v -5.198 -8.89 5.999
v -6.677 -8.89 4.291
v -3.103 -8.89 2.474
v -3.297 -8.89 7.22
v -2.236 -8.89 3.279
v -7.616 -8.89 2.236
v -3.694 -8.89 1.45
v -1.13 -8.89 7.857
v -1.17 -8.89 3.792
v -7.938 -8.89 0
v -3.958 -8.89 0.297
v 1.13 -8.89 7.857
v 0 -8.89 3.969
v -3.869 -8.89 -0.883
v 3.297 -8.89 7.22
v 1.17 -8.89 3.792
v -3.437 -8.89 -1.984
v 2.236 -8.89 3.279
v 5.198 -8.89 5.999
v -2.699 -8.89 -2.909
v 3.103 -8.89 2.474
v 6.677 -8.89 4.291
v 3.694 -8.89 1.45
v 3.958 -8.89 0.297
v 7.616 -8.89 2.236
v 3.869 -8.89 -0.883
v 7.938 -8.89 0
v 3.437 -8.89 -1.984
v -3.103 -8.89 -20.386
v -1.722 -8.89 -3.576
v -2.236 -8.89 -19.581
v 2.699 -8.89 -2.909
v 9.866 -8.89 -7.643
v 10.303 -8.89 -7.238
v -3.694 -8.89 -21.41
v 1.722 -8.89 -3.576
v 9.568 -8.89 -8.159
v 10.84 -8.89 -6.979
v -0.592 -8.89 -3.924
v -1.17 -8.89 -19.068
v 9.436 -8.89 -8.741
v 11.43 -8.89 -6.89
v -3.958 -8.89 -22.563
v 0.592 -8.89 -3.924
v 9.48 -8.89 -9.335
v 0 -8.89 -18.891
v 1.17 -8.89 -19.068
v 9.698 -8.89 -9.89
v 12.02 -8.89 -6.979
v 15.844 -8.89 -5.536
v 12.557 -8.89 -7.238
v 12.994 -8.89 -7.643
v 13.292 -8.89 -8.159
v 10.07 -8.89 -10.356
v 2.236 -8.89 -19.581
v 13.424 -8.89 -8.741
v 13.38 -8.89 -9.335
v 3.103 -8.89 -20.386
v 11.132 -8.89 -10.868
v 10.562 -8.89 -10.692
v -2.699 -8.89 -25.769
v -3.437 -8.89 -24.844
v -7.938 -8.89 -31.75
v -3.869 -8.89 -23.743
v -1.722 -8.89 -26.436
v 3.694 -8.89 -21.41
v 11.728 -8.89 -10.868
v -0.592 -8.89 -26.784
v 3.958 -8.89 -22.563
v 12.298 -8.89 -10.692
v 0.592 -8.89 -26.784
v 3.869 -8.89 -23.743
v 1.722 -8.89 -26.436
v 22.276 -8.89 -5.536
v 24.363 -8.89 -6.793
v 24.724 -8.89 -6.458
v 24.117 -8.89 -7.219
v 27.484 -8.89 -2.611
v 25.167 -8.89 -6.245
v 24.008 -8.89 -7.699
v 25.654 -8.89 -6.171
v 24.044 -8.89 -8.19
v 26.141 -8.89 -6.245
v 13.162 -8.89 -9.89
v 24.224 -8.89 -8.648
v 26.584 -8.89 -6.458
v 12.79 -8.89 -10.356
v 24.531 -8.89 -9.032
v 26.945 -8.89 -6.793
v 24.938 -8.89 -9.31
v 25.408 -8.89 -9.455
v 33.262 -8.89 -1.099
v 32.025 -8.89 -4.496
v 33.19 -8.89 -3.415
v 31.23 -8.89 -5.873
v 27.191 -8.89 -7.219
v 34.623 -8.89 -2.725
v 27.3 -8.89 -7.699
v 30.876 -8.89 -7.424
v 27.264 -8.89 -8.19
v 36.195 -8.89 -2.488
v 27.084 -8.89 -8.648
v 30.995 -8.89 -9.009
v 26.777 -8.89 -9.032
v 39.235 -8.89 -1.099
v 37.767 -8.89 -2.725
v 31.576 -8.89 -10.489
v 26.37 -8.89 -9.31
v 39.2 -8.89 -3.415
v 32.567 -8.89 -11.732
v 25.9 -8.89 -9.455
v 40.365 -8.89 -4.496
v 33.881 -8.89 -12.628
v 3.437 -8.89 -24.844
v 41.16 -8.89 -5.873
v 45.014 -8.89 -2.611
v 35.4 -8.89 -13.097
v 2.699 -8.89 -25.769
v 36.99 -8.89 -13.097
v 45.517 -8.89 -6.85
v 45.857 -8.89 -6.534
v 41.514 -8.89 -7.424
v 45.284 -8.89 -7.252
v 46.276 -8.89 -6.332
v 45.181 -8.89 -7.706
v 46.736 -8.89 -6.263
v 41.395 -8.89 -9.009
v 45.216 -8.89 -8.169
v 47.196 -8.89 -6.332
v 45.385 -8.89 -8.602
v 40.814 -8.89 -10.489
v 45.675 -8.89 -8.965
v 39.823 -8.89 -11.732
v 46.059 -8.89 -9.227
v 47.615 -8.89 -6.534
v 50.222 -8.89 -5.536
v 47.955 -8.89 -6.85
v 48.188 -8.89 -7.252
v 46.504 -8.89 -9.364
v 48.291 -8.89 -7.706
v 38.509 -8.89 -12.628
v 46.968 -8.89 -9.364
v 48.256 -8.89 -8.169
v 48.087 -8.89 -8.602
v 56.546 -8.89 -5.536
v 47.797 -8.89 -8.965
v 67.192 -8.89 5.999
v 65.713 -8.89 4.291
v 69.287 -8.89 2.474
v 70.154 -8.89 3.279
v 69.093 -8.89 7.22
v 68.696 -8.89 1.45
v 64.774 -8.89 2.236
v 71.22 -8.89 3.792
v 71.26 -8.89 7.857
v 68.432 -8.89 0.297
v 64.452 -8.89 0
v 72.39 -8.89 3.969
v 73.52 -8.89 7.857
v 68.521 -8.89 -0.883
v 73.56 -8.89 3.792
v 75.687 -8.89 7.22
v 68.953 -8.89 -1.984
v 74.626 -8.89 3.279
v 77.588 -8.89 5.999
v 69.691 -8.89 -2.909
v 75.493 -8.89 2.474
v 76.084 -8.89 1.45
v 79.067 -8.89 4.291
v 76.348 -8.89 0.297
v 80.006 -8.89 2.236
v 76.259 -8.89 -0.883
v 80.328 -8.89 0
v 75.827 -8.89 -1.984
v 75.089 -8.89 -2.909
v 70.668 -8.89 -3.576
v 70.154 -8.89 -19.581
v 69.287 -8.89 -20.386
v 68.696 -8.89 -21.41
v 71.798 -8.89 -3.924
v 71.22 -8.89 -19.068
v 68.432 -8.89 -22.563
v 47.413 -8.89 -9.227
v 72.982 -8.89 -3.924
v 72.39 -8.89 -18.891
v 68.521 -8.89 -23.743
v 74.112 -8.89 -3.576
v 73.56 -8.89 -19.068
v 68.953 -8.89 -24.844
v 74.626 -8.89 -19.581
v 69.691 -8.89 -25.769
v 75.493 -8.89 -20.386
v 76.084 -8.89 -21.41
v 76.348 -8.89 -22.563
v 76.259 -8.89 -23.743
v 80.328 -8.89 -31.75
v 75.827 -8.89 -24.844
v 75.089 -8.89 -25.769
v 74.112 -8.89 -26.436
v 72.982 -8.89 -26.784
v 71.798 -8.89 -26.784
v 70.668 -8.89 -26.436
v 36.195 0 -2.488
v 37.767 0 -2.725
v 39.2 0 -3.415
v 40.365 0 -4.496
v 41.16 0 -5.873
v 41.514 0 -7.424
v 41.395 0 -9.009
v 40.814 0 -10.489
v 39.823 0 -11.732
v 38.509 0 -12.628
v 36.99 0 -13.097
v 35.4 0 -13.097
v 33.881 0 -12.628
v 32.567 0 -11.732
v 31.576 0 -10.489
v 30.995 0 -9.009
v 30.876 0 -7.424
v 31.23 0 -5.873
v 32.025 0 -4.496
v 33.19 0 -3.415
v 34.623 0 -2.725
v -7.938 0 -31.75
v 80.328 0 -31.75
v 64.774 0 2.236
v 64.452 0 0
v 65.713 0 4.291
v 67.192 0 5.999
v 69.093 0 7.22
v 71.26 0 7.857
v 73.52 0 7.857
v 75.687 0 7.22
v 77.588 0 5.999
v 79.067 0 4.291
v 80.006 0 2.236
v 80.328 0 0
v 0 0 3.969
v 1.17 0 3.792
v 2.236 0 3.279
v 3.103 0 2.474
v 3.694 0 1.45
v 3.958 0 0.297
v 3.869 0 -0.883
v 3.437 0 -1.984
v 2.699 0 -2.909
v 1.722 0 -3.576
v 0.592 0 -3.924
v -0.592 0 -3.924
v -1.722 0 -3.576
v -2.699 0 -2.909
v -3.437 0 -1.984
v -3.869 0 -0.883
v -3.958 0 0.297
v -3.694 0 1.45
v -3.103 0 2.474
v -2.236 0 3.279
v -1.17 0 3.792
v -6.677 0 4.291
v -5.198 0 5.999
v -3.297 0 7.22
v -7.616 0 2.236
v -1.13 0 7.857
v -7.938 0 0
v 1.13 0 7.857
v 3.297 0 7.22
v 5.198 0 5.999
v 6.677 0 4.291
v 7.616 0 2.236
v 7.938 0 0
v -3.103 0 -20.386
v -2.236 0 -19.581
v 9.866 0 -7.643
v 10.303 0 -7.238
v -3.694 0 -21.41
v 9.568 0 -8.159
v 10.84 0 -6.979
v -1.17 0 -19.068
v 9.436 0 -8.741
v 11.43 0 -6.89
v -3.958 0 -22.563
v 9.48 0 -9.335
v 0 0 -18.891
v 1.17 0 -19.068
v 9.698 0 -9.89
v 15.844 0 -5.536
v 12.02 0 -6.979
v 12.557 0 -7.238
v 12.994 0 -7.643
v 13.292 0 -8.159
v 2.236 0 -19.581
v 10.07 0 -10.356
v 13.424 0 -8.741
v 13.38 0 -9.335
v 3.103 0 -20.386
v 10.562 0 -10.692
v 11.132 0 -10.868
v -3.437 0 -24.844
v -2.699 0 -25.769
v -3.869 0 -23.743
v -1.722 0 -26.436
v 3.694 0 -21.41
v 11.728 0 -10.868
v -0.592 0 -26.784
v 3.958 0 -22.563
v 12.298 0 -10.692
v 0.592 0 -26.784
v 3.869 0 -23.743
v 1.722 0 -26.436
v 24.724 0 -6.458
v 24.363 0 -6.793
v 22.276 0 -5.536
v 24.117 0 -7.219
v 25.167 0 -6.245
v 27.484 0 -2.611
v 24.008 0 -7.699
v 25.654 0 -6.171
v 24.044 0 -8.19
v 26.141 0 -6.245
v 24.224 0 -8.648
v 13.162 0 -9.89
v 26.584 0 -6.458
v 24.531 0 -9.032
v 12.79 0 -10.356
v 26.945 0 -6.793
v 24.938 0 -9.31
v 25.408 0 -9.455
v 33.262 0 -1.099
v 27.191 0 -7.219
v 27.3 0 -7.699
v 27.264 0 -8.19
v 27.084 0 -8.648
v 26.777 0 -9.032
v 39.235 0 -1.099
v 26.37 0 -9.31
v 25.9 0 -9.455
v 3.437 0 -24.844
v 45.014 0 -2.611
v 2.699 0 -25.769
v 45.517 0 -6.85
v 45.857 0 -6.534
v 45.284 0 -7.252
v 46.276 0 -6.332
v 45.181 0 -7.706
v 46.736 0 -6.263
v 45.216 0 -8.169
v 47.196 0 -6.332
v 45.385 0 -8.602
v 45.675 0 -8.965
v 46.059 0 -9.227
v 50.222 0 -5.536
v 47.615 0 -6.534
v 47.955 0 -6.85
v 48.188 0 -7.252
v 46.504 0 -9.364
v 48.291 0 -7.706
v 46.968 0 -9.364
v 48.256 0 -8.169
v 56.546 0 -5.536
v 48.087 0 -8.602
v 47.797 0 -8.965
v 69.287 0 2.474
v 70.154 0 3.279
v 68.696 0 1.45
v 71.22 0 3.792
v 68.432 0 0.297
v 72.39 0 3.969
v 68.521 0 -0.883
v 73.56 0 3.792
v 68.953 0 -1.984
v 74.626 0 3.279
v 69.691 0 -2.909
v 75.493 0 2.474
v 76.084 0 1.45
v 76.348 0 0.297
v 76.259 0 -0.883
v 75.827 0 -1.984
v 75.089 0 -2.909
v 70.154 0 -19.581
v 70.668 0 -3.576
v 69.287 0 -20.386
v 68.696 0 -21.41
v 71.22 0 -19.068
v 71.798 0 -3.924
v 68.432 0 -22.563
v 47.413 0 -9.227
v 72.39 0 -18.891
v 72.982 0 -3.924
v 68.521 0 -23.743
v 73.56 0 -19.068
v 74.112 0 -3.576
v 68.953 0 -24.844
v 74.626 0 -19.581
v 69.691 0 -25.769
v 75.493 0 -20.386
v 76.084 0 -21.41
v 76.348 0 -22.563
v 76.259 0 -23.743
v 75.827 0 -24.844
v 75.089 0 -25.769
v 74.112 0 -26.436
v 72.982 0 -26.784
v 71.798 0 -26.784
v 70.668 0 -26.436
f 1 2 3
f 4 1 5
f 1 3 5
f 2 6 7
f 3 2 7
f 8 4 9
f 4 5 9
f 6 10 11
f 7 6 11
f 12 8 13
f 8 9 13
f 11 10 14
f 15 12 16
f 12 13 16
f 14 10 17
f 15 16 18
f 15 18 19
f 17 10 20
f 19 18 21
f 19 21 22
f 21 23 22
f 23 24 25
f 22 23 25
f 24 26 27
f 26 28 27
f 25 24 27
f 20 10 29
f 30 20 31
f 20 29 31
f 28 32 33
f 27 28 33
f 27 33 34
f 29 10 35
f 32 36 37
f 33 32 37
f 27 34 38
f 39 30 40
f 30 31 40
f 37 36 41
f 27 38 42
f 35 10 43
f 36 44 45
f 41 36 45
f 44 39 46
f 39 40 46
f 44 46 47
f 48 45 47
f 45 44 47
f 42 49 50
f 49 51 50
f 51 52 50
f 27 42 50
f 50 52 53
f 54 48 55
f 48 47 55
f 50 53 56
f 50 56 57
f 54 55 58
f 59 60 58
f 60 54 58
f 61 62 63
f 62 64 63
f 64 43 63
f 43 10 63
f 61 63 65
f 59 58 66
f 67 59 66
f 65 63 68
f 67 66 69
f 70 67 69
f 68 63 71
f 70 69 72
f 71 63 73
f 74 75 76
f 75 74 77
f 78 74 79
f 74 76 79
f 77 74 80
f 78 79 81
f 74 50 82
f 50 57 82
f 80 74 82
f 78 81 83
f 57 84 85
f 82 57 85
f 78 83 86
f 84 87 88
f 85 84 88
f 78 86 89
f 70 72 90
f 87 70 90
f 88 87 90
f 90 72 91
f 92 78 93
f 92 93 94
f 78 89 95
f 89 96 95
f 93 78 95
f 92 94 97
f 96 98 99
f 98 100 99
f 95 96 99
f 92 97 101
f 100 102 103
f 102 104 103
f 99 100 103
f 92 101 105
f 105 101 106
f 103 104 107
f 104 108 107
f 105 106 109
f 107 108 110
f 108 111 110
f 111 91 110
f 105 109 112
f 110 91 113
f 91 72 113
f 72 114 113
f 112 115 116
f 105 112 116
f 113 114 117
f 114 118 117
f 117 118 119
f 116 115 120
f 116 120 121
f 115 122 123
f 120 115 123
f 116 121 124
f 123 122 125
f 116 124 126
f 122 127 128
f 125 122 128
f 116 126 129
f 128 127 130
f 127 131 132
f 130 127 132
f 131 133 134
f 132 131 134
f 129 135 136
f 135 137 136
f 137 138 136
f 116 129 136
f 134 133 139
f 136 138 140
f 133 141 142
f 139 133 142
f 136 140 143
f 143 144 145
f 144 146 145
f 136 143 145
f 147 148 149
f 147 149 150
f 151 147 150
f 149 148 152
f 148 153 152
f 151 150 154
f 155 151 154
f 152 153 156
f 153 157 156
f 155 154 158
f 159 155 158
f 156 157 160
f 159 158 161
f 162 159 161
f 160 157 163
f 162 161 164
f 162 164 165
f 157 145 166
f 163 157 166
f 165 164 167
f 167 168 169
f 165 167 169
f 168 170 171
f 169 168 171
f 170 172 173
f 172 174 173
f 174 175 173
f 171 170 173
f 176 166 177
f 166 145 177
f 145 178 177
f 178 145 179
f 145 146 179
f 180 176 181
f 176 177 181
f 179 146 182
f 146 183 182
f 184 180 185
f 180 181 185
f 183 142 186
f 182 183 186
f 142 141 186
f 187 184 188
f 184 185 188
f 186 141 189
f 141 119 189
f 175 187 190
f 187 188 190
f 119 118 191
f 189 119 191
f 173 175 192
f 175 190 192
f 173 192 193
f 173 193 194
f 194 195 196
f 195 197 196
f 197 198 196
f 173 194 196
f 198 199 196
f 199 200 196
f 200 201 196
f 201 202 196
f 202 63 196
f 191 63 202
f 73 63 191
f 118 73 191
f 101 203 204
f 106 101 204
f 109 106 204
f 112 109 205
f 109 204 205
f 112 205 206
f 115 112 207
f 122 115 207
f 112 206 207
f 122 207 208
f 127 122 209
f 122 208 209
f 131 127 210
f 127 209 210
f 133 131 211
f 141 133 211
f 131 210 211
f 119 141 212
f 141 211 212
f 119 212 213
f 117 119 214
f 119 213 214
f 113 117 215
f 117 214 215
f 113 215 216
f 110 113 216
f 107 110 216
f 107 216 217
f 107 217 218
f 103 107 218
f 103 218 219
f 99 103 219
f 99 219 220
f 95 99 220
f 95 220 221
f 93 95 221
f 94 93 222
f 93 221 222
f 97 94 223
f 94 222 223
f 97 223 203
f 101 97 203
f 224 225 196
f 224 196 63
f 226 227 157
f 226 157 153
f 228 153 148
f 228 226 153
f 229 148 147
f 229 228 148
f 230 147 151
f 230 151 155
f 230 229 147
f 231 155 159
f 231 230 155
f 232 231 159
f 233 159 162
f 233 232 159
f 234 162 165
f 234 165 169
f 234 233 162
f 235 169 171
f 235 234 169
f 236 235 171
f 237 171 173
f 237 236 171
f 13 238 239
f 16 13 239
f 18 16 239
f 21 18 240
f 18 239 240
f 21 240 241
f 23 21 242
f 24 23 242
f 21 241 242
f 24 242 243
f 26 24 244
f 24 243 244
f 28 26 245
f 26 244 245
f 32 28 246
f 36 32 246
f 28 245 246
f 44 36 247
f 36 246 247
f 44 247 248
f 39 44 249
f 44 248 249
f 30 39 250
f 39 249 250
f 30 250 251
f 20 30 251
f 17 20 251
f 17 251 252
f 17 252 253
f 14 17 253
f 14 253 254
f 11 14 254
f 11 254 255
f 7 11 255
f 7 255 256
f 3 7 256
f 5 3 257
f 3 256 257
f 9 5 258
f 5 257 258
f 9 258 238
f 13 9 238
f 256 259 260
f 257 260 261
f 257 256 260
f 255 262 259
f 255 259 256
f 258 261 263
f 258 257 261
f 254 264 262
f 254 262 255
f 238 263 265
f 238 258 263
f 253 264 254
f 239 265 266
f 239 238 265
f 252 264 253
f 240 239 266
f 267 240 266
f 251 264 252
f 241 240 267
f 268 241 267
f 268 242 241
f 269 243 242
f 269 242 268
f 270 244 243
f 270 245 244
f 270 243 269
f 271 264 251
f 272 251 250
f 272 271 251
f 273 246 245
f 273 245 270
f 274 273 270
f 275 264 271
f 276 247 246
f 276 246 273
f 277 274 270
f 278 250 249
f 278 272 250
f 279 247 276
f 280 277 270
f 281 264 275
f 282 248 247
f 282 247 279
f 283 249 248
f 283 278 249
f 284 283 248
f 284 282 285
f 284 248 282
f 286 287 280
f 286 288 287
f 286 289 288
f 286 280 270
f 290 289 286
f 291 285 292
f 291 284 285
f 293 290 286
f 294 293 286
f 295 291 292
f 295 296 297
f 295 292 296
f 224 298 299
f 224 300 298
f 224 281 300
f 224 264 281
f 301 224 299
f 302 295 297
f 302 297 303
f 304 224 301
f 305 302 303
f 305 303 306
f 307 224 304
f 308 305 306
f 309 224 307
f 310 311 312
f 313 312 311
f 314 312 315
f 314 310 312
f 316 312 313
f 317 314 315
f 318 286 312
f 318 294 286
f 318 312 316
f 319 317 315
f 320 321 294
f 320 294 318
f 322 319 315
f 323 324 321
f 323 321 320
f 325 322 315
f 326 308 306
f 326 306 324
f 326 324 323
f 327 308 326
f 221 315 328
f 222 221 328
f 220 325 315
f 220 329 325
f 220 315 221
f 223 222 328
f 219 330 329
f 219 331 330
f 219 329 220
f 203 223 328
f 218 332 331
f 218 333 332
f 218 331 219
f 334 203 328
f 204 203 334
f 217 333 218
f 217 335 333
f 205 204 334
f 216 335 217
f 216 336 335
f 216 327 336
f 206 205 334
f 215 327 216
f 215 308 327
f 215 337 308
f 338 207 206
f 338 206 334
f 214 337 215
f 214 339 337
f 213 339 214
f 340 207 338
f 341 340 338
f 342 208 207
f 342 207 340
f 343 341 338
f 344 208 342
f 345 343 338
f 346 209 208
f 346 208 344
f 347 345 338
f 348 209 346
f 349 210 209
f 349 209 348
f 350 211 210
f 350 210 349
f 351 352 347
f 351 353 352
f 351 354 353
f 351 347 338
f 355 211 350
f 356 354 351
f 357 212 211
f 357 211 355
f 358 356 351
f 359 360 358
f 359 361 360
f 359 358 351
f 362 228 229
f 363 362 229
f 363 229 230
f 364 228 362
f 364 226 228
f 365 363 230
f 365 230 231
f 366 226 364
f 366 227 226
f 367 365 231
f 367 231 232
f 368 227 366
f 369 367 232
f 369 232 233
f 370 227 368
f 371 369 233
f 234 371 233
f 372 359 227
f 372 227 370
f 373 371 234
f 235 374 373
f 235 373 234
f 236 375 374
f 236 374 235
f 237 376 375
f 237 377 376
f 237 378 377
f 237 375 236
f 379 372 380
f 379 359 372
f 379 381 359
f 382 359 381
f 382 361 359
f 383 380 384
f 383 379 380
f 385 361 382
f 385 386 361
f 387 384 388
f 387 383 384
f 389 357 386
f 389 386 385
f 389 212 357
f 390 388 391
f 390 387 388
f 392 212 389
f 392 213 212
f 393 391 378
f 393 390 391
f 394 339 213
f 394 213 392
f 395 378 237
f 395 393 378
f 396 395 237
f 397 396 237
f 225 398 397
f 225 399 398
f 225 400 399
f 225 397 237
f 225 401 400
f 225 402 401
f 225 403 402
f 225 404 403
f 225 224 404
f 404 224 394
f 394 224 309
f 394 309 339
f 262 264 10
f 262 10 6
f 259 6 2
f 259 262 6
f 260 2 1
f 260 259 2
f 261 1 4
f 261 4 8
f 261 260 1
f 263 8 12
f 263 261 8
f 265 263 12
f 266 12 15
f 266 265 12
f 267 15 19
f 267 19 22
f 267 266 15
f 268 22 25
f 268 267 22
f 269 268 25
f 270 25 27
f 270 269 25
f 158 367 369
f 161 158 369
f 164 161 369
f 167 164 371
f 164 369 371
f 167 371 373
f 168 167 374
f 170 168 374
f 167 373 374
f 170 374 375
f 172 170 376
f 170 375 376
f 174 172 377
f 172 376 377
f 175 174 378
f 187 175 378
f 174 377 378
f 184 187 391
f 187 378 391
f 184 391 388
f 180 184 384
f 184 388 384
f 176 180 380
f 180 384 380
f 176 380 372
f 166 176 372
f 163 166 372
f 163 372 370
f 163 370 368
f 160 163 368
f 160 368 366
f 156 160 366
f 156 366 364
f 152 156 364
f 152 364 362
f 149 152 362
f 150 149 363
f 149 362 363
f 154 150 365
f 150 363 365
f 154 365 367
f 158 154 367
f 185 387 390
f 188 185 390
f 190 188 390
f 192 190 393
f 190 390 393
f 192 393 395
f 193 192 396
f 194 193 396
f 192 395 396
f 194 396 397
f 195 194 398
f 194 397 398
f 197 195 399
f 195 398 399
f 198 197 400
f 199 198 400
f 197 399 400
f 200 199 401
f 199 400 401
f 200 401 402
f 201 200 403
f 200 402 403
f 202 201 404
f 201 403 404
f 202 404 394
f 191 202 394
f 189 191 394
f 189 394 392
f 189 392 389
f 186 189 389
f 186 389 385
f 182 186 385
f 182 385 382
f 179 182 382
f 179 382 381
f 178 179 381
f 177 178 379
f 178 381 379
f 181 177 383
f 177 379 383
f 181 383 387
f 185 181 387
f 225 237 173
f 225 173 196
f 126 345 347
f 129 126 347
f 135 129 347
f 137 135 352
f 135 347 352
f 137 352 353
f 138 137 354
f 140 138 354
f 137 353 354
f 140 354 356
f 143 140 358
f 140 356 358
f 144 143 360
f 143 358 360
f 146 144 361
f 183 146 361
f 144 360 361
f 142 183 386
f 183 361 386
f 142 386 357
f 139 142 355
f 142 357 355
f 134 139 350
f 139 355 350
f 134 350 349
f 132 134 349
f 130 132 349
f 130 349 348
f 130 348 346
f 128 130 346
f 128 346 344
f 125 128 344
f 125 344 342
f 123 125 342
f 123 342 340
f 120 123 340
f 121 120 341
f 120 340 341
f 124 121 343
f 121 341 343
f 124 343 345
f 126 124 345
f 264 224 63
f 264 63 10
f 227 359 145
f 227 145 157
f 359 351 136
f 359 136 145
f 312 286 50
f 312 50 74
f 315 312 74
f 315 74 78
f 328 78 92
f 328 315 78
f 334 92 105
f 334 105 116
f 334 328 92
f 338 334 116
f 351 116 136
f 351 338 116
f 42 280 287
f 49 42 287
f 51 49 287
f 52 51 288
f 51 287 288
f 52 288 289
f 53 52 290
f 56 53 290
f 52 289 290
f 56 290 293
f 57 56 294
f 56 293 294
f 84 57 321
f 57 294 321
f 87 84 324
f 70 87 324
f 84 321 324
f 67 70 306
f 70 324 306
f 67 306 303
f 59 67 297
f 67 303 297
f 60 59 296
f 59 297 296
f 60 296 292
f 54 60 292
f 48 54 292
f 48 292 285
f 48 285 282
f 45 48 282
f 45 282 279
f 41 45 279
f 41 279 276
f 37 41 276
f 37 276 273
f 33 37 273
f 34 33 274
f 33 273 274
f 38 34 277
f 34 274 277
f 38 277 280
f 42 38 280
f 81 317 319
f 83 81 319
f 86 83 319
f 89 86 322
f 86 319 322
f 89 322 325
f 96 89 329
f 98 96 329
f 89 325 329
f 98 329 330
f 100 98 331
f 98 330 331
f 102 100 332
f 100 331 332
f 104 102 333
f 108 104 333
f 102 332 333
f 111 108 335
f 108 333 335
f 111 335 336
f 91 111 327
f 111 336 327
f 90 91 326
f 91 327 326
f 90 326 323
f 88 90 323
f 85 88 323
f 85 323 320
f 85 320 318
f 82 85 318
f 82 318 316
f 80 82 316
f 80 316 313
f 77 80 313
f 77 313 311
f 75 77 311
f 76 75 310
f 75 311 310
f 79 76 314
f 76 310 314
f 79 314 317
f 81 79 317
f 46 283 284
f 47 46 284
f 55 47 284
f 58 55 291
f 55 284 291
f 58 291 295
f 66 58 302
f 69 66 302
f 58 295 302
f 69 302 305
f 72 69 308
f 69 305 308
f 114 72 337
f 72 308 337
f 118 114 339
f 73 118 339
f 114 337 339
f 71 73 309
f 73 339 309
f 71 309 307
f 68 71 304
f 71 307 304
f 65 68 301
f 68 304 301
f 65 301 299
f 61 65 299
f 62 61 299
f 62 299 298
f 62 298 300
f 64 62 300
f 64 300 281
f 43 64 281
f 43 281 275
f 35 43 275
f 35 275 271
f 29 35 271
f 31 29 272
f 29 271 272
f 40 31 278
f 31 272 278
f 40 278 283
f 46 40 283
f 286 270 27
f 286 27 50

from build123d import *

# Parameters (mm, degrees)
SKETCH1_R           = 3.96875
SKETCH1_R_2         = 2
SKETCH1_R_3         = 1.651
SKETCH1_R_4         = 1.559587107
SKETCH1_R_5         = 5.334
BOSS_EXTRUDE1_DEPTH = 8.89


with BuildPart() as part:
    # Sketch1 → Boss-Extrude1 (new body)
    with BuildSketch(Plane(origin=(0, 0, 0), x_dir=(1, 0, 0), z_dir=(0, 1, 0))):
        with BuildLine():
            Line((80.3275, 31.75), (-7.9375, 31.75))
            Line((-7.9375, 31.75), (-7.9375, 13.97))
            Line((-7.9375, 13.97), (-7.9375, 0))
            ThreePointArc((-7.9375, 0), (0, -7.9375), (7.9375, 0))
            Line((7.9375, 0), (15.843955531, 5.536159764))
            Line((15.843955531, 5.536159764), (22.275753266, 5.536159764))
            ThreePointArc((22.275753266, 5.536159764), (36.248751472, 0.907685249), (50.221749679, 5.536159764))
            Line((50.221749679, 5.536159764), (56.546044469, 5.536159764))
            Line((56.546044469, 5.536159764), (64.4525, 0))
            ThreePointArc((64.4525, 0), (72.39, -7.9375), (80.3275, 0))
            Line((80.3275, 0), (80.3275, 13.97))
            Line((80.3275, 13.97), (80.3275, 31.75))
        make_face()
        with Locations(Location((0, 0, 0), (0, 0, 270))):
            Circle(SKETCH1_R, mode=Mode.SUBTRACT)
        with Locations(Location((72.39, 0, 0), (0, 0, 270))):
            Circle(SKETCH1_R, mode=Mode.SUBTRACT)
        with Locations(Location((72.39, 22.86, 0), (0, 0, 270))):
            Circle(SKETCH1_R, mode=Mode.SUBTRACT)
        with Locations(Location((0, 22.86, 0), (0, 0, 270))):
            Circle(SKETCH1_R, mode=Mode.SUBTRACT)
        with Locations(Location((11.43, 8.89, 0), (0, 0, 270))):
            Circle(SKETCH1_R_2, mode=Mode.SUBTRACT)
        with Locations(Location((25.654, 7.822159764, 0), (0, 0, 270))):
            Circle(SKETCH1_R_3, mode=Mode.SUBTRACT)
        with Locations(Location((46.736, 7.822159764, 0), (0, 0, 270))):
            Circle(SKETCH1_R_4, mode=Mode.SUBTRACT)
        with Locations(Location((36.195, 7.822159764, 0), (0, 0, 270))):
            Circle(SKETCH1_R_5, mode=Mode.SUBTRACT)
    extrude(amount=-BOSS_EXTRUDE1_DEPTH)


solid = part.part
